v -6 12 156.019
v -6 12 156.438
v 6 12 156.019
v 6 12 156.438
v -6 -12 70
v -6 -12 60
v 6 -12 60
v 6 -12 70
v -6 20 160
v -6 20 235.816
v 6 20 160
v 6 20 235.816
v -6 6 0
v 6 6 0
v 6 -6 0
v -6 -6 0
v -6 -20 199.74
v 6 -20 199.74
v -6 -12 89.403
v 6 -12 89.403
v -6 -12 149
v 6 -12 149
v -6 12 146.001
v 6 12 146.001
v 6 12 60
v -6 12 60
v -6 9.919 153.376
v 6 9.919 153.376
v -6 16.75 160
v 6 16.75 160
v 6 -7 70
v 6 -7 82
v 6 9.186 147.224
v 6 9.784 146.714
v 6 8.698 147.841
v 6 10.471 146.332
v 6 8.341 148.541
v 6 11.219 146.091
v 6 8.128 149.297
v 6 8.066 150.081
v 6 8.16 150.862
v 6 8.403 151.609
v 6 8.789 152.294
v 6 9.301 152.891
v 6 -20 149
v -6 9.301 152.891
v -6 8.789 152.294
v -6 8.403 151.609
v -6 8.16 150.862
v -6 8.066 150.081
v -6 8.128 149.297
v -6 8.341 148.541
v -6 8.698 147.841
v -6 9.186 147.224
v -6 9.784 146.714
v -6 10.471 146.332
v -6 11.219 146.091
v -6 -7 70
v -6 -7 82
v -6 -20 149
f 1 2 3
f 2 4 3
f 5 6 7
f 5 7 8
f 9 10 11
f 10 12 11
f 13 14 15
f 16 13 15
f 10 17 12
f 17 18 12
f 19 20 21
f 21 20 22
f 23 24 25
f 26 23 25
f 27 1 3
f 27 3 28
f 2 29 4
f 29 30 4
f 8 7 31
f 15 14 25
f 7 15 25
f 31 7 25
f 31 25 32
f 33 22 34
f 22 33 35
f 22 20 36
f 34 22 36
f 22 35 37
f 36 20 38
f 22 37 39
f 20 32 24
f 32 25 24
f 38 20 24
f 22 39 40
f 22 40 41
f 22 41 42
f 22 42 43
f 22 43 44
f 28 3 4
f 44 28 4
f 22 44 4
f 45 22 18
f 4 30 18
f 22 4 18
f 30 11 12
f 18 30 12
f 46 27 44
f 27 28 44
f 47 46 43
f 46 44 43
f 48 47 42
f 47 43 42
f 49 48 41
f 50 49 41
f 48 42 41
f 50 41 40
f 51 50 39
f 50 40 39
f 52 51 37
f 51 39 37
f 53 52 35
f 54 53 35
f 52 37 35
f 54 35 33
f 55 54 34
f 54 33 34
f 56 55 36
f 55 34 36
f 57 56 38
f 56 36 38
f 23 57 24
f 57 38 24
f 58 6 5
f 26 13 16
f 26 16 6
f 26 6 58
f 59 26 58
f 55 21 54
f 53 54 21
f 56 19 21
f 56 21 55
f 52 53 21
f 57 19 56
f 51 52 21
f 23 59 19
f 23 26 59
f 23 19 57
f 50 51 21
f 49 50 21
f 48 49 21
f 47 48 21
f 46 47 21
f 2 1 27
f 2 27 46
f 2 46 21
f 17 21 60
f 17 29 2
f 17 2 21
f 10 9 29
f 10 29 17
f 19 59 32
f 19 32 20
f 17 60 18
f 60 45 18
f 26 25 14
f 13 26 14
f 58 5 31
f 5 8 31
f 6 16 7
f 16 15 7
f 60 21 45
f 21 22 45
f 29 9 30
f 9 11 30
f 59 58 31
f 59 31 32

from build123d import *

# Parameters (mm, degrees)
EXTRUDE_1_DEPTH = 6


with BuildPart() as part:
    # 스케치1 → 보스-돌출1 (new, symmetric)
    with BuildSketch(Plane(origin=(0, 0, 0), x_dir=(0, 0, -1), z_dir=(1, 0, 0))):
        with BuildLine():
            Line((0, 6), (0, -6))
            Line((0, -6), (-60, -12))
            Line((-60, -12), (-70, -12))
            Line((-70, -12), (-70, -7))
            Line((-70, -7), (-82, -7))
            Line((-82, -7), (-89.403074012, -12))
            Line((-89.403074012, -12), (-149, -12))
            Line((-149, -12), (-149, -20))
            Line((-149, -20), (-199.739657381, -20))
            Line((-199.739657381, -20), (-235.816329231, 20))
            Line((-235.816329231, 20), (-160, 20))
            Line((-160, 20), (-160, 16.749981814))
            Line((-160, 16.749981814), (-156.437513639, 12))
            Line((-156.437513639, 12), (-156.019273901, 12))
            Line((-156.019273901, 12), (-153.375521927, 9.919487169))
            ThreePointArc((-153.375521927, 9.919487169), (-148.913971149, 8.215866364), (-146.000538153, 12))
            Line((-146.000538153, 12), (-60, 12))
            Line((-60, 12), (0, 6))
        make_face()
    extrude(amount=EXTRUDE_1_DEPTH, both=True)


solid = part.part
